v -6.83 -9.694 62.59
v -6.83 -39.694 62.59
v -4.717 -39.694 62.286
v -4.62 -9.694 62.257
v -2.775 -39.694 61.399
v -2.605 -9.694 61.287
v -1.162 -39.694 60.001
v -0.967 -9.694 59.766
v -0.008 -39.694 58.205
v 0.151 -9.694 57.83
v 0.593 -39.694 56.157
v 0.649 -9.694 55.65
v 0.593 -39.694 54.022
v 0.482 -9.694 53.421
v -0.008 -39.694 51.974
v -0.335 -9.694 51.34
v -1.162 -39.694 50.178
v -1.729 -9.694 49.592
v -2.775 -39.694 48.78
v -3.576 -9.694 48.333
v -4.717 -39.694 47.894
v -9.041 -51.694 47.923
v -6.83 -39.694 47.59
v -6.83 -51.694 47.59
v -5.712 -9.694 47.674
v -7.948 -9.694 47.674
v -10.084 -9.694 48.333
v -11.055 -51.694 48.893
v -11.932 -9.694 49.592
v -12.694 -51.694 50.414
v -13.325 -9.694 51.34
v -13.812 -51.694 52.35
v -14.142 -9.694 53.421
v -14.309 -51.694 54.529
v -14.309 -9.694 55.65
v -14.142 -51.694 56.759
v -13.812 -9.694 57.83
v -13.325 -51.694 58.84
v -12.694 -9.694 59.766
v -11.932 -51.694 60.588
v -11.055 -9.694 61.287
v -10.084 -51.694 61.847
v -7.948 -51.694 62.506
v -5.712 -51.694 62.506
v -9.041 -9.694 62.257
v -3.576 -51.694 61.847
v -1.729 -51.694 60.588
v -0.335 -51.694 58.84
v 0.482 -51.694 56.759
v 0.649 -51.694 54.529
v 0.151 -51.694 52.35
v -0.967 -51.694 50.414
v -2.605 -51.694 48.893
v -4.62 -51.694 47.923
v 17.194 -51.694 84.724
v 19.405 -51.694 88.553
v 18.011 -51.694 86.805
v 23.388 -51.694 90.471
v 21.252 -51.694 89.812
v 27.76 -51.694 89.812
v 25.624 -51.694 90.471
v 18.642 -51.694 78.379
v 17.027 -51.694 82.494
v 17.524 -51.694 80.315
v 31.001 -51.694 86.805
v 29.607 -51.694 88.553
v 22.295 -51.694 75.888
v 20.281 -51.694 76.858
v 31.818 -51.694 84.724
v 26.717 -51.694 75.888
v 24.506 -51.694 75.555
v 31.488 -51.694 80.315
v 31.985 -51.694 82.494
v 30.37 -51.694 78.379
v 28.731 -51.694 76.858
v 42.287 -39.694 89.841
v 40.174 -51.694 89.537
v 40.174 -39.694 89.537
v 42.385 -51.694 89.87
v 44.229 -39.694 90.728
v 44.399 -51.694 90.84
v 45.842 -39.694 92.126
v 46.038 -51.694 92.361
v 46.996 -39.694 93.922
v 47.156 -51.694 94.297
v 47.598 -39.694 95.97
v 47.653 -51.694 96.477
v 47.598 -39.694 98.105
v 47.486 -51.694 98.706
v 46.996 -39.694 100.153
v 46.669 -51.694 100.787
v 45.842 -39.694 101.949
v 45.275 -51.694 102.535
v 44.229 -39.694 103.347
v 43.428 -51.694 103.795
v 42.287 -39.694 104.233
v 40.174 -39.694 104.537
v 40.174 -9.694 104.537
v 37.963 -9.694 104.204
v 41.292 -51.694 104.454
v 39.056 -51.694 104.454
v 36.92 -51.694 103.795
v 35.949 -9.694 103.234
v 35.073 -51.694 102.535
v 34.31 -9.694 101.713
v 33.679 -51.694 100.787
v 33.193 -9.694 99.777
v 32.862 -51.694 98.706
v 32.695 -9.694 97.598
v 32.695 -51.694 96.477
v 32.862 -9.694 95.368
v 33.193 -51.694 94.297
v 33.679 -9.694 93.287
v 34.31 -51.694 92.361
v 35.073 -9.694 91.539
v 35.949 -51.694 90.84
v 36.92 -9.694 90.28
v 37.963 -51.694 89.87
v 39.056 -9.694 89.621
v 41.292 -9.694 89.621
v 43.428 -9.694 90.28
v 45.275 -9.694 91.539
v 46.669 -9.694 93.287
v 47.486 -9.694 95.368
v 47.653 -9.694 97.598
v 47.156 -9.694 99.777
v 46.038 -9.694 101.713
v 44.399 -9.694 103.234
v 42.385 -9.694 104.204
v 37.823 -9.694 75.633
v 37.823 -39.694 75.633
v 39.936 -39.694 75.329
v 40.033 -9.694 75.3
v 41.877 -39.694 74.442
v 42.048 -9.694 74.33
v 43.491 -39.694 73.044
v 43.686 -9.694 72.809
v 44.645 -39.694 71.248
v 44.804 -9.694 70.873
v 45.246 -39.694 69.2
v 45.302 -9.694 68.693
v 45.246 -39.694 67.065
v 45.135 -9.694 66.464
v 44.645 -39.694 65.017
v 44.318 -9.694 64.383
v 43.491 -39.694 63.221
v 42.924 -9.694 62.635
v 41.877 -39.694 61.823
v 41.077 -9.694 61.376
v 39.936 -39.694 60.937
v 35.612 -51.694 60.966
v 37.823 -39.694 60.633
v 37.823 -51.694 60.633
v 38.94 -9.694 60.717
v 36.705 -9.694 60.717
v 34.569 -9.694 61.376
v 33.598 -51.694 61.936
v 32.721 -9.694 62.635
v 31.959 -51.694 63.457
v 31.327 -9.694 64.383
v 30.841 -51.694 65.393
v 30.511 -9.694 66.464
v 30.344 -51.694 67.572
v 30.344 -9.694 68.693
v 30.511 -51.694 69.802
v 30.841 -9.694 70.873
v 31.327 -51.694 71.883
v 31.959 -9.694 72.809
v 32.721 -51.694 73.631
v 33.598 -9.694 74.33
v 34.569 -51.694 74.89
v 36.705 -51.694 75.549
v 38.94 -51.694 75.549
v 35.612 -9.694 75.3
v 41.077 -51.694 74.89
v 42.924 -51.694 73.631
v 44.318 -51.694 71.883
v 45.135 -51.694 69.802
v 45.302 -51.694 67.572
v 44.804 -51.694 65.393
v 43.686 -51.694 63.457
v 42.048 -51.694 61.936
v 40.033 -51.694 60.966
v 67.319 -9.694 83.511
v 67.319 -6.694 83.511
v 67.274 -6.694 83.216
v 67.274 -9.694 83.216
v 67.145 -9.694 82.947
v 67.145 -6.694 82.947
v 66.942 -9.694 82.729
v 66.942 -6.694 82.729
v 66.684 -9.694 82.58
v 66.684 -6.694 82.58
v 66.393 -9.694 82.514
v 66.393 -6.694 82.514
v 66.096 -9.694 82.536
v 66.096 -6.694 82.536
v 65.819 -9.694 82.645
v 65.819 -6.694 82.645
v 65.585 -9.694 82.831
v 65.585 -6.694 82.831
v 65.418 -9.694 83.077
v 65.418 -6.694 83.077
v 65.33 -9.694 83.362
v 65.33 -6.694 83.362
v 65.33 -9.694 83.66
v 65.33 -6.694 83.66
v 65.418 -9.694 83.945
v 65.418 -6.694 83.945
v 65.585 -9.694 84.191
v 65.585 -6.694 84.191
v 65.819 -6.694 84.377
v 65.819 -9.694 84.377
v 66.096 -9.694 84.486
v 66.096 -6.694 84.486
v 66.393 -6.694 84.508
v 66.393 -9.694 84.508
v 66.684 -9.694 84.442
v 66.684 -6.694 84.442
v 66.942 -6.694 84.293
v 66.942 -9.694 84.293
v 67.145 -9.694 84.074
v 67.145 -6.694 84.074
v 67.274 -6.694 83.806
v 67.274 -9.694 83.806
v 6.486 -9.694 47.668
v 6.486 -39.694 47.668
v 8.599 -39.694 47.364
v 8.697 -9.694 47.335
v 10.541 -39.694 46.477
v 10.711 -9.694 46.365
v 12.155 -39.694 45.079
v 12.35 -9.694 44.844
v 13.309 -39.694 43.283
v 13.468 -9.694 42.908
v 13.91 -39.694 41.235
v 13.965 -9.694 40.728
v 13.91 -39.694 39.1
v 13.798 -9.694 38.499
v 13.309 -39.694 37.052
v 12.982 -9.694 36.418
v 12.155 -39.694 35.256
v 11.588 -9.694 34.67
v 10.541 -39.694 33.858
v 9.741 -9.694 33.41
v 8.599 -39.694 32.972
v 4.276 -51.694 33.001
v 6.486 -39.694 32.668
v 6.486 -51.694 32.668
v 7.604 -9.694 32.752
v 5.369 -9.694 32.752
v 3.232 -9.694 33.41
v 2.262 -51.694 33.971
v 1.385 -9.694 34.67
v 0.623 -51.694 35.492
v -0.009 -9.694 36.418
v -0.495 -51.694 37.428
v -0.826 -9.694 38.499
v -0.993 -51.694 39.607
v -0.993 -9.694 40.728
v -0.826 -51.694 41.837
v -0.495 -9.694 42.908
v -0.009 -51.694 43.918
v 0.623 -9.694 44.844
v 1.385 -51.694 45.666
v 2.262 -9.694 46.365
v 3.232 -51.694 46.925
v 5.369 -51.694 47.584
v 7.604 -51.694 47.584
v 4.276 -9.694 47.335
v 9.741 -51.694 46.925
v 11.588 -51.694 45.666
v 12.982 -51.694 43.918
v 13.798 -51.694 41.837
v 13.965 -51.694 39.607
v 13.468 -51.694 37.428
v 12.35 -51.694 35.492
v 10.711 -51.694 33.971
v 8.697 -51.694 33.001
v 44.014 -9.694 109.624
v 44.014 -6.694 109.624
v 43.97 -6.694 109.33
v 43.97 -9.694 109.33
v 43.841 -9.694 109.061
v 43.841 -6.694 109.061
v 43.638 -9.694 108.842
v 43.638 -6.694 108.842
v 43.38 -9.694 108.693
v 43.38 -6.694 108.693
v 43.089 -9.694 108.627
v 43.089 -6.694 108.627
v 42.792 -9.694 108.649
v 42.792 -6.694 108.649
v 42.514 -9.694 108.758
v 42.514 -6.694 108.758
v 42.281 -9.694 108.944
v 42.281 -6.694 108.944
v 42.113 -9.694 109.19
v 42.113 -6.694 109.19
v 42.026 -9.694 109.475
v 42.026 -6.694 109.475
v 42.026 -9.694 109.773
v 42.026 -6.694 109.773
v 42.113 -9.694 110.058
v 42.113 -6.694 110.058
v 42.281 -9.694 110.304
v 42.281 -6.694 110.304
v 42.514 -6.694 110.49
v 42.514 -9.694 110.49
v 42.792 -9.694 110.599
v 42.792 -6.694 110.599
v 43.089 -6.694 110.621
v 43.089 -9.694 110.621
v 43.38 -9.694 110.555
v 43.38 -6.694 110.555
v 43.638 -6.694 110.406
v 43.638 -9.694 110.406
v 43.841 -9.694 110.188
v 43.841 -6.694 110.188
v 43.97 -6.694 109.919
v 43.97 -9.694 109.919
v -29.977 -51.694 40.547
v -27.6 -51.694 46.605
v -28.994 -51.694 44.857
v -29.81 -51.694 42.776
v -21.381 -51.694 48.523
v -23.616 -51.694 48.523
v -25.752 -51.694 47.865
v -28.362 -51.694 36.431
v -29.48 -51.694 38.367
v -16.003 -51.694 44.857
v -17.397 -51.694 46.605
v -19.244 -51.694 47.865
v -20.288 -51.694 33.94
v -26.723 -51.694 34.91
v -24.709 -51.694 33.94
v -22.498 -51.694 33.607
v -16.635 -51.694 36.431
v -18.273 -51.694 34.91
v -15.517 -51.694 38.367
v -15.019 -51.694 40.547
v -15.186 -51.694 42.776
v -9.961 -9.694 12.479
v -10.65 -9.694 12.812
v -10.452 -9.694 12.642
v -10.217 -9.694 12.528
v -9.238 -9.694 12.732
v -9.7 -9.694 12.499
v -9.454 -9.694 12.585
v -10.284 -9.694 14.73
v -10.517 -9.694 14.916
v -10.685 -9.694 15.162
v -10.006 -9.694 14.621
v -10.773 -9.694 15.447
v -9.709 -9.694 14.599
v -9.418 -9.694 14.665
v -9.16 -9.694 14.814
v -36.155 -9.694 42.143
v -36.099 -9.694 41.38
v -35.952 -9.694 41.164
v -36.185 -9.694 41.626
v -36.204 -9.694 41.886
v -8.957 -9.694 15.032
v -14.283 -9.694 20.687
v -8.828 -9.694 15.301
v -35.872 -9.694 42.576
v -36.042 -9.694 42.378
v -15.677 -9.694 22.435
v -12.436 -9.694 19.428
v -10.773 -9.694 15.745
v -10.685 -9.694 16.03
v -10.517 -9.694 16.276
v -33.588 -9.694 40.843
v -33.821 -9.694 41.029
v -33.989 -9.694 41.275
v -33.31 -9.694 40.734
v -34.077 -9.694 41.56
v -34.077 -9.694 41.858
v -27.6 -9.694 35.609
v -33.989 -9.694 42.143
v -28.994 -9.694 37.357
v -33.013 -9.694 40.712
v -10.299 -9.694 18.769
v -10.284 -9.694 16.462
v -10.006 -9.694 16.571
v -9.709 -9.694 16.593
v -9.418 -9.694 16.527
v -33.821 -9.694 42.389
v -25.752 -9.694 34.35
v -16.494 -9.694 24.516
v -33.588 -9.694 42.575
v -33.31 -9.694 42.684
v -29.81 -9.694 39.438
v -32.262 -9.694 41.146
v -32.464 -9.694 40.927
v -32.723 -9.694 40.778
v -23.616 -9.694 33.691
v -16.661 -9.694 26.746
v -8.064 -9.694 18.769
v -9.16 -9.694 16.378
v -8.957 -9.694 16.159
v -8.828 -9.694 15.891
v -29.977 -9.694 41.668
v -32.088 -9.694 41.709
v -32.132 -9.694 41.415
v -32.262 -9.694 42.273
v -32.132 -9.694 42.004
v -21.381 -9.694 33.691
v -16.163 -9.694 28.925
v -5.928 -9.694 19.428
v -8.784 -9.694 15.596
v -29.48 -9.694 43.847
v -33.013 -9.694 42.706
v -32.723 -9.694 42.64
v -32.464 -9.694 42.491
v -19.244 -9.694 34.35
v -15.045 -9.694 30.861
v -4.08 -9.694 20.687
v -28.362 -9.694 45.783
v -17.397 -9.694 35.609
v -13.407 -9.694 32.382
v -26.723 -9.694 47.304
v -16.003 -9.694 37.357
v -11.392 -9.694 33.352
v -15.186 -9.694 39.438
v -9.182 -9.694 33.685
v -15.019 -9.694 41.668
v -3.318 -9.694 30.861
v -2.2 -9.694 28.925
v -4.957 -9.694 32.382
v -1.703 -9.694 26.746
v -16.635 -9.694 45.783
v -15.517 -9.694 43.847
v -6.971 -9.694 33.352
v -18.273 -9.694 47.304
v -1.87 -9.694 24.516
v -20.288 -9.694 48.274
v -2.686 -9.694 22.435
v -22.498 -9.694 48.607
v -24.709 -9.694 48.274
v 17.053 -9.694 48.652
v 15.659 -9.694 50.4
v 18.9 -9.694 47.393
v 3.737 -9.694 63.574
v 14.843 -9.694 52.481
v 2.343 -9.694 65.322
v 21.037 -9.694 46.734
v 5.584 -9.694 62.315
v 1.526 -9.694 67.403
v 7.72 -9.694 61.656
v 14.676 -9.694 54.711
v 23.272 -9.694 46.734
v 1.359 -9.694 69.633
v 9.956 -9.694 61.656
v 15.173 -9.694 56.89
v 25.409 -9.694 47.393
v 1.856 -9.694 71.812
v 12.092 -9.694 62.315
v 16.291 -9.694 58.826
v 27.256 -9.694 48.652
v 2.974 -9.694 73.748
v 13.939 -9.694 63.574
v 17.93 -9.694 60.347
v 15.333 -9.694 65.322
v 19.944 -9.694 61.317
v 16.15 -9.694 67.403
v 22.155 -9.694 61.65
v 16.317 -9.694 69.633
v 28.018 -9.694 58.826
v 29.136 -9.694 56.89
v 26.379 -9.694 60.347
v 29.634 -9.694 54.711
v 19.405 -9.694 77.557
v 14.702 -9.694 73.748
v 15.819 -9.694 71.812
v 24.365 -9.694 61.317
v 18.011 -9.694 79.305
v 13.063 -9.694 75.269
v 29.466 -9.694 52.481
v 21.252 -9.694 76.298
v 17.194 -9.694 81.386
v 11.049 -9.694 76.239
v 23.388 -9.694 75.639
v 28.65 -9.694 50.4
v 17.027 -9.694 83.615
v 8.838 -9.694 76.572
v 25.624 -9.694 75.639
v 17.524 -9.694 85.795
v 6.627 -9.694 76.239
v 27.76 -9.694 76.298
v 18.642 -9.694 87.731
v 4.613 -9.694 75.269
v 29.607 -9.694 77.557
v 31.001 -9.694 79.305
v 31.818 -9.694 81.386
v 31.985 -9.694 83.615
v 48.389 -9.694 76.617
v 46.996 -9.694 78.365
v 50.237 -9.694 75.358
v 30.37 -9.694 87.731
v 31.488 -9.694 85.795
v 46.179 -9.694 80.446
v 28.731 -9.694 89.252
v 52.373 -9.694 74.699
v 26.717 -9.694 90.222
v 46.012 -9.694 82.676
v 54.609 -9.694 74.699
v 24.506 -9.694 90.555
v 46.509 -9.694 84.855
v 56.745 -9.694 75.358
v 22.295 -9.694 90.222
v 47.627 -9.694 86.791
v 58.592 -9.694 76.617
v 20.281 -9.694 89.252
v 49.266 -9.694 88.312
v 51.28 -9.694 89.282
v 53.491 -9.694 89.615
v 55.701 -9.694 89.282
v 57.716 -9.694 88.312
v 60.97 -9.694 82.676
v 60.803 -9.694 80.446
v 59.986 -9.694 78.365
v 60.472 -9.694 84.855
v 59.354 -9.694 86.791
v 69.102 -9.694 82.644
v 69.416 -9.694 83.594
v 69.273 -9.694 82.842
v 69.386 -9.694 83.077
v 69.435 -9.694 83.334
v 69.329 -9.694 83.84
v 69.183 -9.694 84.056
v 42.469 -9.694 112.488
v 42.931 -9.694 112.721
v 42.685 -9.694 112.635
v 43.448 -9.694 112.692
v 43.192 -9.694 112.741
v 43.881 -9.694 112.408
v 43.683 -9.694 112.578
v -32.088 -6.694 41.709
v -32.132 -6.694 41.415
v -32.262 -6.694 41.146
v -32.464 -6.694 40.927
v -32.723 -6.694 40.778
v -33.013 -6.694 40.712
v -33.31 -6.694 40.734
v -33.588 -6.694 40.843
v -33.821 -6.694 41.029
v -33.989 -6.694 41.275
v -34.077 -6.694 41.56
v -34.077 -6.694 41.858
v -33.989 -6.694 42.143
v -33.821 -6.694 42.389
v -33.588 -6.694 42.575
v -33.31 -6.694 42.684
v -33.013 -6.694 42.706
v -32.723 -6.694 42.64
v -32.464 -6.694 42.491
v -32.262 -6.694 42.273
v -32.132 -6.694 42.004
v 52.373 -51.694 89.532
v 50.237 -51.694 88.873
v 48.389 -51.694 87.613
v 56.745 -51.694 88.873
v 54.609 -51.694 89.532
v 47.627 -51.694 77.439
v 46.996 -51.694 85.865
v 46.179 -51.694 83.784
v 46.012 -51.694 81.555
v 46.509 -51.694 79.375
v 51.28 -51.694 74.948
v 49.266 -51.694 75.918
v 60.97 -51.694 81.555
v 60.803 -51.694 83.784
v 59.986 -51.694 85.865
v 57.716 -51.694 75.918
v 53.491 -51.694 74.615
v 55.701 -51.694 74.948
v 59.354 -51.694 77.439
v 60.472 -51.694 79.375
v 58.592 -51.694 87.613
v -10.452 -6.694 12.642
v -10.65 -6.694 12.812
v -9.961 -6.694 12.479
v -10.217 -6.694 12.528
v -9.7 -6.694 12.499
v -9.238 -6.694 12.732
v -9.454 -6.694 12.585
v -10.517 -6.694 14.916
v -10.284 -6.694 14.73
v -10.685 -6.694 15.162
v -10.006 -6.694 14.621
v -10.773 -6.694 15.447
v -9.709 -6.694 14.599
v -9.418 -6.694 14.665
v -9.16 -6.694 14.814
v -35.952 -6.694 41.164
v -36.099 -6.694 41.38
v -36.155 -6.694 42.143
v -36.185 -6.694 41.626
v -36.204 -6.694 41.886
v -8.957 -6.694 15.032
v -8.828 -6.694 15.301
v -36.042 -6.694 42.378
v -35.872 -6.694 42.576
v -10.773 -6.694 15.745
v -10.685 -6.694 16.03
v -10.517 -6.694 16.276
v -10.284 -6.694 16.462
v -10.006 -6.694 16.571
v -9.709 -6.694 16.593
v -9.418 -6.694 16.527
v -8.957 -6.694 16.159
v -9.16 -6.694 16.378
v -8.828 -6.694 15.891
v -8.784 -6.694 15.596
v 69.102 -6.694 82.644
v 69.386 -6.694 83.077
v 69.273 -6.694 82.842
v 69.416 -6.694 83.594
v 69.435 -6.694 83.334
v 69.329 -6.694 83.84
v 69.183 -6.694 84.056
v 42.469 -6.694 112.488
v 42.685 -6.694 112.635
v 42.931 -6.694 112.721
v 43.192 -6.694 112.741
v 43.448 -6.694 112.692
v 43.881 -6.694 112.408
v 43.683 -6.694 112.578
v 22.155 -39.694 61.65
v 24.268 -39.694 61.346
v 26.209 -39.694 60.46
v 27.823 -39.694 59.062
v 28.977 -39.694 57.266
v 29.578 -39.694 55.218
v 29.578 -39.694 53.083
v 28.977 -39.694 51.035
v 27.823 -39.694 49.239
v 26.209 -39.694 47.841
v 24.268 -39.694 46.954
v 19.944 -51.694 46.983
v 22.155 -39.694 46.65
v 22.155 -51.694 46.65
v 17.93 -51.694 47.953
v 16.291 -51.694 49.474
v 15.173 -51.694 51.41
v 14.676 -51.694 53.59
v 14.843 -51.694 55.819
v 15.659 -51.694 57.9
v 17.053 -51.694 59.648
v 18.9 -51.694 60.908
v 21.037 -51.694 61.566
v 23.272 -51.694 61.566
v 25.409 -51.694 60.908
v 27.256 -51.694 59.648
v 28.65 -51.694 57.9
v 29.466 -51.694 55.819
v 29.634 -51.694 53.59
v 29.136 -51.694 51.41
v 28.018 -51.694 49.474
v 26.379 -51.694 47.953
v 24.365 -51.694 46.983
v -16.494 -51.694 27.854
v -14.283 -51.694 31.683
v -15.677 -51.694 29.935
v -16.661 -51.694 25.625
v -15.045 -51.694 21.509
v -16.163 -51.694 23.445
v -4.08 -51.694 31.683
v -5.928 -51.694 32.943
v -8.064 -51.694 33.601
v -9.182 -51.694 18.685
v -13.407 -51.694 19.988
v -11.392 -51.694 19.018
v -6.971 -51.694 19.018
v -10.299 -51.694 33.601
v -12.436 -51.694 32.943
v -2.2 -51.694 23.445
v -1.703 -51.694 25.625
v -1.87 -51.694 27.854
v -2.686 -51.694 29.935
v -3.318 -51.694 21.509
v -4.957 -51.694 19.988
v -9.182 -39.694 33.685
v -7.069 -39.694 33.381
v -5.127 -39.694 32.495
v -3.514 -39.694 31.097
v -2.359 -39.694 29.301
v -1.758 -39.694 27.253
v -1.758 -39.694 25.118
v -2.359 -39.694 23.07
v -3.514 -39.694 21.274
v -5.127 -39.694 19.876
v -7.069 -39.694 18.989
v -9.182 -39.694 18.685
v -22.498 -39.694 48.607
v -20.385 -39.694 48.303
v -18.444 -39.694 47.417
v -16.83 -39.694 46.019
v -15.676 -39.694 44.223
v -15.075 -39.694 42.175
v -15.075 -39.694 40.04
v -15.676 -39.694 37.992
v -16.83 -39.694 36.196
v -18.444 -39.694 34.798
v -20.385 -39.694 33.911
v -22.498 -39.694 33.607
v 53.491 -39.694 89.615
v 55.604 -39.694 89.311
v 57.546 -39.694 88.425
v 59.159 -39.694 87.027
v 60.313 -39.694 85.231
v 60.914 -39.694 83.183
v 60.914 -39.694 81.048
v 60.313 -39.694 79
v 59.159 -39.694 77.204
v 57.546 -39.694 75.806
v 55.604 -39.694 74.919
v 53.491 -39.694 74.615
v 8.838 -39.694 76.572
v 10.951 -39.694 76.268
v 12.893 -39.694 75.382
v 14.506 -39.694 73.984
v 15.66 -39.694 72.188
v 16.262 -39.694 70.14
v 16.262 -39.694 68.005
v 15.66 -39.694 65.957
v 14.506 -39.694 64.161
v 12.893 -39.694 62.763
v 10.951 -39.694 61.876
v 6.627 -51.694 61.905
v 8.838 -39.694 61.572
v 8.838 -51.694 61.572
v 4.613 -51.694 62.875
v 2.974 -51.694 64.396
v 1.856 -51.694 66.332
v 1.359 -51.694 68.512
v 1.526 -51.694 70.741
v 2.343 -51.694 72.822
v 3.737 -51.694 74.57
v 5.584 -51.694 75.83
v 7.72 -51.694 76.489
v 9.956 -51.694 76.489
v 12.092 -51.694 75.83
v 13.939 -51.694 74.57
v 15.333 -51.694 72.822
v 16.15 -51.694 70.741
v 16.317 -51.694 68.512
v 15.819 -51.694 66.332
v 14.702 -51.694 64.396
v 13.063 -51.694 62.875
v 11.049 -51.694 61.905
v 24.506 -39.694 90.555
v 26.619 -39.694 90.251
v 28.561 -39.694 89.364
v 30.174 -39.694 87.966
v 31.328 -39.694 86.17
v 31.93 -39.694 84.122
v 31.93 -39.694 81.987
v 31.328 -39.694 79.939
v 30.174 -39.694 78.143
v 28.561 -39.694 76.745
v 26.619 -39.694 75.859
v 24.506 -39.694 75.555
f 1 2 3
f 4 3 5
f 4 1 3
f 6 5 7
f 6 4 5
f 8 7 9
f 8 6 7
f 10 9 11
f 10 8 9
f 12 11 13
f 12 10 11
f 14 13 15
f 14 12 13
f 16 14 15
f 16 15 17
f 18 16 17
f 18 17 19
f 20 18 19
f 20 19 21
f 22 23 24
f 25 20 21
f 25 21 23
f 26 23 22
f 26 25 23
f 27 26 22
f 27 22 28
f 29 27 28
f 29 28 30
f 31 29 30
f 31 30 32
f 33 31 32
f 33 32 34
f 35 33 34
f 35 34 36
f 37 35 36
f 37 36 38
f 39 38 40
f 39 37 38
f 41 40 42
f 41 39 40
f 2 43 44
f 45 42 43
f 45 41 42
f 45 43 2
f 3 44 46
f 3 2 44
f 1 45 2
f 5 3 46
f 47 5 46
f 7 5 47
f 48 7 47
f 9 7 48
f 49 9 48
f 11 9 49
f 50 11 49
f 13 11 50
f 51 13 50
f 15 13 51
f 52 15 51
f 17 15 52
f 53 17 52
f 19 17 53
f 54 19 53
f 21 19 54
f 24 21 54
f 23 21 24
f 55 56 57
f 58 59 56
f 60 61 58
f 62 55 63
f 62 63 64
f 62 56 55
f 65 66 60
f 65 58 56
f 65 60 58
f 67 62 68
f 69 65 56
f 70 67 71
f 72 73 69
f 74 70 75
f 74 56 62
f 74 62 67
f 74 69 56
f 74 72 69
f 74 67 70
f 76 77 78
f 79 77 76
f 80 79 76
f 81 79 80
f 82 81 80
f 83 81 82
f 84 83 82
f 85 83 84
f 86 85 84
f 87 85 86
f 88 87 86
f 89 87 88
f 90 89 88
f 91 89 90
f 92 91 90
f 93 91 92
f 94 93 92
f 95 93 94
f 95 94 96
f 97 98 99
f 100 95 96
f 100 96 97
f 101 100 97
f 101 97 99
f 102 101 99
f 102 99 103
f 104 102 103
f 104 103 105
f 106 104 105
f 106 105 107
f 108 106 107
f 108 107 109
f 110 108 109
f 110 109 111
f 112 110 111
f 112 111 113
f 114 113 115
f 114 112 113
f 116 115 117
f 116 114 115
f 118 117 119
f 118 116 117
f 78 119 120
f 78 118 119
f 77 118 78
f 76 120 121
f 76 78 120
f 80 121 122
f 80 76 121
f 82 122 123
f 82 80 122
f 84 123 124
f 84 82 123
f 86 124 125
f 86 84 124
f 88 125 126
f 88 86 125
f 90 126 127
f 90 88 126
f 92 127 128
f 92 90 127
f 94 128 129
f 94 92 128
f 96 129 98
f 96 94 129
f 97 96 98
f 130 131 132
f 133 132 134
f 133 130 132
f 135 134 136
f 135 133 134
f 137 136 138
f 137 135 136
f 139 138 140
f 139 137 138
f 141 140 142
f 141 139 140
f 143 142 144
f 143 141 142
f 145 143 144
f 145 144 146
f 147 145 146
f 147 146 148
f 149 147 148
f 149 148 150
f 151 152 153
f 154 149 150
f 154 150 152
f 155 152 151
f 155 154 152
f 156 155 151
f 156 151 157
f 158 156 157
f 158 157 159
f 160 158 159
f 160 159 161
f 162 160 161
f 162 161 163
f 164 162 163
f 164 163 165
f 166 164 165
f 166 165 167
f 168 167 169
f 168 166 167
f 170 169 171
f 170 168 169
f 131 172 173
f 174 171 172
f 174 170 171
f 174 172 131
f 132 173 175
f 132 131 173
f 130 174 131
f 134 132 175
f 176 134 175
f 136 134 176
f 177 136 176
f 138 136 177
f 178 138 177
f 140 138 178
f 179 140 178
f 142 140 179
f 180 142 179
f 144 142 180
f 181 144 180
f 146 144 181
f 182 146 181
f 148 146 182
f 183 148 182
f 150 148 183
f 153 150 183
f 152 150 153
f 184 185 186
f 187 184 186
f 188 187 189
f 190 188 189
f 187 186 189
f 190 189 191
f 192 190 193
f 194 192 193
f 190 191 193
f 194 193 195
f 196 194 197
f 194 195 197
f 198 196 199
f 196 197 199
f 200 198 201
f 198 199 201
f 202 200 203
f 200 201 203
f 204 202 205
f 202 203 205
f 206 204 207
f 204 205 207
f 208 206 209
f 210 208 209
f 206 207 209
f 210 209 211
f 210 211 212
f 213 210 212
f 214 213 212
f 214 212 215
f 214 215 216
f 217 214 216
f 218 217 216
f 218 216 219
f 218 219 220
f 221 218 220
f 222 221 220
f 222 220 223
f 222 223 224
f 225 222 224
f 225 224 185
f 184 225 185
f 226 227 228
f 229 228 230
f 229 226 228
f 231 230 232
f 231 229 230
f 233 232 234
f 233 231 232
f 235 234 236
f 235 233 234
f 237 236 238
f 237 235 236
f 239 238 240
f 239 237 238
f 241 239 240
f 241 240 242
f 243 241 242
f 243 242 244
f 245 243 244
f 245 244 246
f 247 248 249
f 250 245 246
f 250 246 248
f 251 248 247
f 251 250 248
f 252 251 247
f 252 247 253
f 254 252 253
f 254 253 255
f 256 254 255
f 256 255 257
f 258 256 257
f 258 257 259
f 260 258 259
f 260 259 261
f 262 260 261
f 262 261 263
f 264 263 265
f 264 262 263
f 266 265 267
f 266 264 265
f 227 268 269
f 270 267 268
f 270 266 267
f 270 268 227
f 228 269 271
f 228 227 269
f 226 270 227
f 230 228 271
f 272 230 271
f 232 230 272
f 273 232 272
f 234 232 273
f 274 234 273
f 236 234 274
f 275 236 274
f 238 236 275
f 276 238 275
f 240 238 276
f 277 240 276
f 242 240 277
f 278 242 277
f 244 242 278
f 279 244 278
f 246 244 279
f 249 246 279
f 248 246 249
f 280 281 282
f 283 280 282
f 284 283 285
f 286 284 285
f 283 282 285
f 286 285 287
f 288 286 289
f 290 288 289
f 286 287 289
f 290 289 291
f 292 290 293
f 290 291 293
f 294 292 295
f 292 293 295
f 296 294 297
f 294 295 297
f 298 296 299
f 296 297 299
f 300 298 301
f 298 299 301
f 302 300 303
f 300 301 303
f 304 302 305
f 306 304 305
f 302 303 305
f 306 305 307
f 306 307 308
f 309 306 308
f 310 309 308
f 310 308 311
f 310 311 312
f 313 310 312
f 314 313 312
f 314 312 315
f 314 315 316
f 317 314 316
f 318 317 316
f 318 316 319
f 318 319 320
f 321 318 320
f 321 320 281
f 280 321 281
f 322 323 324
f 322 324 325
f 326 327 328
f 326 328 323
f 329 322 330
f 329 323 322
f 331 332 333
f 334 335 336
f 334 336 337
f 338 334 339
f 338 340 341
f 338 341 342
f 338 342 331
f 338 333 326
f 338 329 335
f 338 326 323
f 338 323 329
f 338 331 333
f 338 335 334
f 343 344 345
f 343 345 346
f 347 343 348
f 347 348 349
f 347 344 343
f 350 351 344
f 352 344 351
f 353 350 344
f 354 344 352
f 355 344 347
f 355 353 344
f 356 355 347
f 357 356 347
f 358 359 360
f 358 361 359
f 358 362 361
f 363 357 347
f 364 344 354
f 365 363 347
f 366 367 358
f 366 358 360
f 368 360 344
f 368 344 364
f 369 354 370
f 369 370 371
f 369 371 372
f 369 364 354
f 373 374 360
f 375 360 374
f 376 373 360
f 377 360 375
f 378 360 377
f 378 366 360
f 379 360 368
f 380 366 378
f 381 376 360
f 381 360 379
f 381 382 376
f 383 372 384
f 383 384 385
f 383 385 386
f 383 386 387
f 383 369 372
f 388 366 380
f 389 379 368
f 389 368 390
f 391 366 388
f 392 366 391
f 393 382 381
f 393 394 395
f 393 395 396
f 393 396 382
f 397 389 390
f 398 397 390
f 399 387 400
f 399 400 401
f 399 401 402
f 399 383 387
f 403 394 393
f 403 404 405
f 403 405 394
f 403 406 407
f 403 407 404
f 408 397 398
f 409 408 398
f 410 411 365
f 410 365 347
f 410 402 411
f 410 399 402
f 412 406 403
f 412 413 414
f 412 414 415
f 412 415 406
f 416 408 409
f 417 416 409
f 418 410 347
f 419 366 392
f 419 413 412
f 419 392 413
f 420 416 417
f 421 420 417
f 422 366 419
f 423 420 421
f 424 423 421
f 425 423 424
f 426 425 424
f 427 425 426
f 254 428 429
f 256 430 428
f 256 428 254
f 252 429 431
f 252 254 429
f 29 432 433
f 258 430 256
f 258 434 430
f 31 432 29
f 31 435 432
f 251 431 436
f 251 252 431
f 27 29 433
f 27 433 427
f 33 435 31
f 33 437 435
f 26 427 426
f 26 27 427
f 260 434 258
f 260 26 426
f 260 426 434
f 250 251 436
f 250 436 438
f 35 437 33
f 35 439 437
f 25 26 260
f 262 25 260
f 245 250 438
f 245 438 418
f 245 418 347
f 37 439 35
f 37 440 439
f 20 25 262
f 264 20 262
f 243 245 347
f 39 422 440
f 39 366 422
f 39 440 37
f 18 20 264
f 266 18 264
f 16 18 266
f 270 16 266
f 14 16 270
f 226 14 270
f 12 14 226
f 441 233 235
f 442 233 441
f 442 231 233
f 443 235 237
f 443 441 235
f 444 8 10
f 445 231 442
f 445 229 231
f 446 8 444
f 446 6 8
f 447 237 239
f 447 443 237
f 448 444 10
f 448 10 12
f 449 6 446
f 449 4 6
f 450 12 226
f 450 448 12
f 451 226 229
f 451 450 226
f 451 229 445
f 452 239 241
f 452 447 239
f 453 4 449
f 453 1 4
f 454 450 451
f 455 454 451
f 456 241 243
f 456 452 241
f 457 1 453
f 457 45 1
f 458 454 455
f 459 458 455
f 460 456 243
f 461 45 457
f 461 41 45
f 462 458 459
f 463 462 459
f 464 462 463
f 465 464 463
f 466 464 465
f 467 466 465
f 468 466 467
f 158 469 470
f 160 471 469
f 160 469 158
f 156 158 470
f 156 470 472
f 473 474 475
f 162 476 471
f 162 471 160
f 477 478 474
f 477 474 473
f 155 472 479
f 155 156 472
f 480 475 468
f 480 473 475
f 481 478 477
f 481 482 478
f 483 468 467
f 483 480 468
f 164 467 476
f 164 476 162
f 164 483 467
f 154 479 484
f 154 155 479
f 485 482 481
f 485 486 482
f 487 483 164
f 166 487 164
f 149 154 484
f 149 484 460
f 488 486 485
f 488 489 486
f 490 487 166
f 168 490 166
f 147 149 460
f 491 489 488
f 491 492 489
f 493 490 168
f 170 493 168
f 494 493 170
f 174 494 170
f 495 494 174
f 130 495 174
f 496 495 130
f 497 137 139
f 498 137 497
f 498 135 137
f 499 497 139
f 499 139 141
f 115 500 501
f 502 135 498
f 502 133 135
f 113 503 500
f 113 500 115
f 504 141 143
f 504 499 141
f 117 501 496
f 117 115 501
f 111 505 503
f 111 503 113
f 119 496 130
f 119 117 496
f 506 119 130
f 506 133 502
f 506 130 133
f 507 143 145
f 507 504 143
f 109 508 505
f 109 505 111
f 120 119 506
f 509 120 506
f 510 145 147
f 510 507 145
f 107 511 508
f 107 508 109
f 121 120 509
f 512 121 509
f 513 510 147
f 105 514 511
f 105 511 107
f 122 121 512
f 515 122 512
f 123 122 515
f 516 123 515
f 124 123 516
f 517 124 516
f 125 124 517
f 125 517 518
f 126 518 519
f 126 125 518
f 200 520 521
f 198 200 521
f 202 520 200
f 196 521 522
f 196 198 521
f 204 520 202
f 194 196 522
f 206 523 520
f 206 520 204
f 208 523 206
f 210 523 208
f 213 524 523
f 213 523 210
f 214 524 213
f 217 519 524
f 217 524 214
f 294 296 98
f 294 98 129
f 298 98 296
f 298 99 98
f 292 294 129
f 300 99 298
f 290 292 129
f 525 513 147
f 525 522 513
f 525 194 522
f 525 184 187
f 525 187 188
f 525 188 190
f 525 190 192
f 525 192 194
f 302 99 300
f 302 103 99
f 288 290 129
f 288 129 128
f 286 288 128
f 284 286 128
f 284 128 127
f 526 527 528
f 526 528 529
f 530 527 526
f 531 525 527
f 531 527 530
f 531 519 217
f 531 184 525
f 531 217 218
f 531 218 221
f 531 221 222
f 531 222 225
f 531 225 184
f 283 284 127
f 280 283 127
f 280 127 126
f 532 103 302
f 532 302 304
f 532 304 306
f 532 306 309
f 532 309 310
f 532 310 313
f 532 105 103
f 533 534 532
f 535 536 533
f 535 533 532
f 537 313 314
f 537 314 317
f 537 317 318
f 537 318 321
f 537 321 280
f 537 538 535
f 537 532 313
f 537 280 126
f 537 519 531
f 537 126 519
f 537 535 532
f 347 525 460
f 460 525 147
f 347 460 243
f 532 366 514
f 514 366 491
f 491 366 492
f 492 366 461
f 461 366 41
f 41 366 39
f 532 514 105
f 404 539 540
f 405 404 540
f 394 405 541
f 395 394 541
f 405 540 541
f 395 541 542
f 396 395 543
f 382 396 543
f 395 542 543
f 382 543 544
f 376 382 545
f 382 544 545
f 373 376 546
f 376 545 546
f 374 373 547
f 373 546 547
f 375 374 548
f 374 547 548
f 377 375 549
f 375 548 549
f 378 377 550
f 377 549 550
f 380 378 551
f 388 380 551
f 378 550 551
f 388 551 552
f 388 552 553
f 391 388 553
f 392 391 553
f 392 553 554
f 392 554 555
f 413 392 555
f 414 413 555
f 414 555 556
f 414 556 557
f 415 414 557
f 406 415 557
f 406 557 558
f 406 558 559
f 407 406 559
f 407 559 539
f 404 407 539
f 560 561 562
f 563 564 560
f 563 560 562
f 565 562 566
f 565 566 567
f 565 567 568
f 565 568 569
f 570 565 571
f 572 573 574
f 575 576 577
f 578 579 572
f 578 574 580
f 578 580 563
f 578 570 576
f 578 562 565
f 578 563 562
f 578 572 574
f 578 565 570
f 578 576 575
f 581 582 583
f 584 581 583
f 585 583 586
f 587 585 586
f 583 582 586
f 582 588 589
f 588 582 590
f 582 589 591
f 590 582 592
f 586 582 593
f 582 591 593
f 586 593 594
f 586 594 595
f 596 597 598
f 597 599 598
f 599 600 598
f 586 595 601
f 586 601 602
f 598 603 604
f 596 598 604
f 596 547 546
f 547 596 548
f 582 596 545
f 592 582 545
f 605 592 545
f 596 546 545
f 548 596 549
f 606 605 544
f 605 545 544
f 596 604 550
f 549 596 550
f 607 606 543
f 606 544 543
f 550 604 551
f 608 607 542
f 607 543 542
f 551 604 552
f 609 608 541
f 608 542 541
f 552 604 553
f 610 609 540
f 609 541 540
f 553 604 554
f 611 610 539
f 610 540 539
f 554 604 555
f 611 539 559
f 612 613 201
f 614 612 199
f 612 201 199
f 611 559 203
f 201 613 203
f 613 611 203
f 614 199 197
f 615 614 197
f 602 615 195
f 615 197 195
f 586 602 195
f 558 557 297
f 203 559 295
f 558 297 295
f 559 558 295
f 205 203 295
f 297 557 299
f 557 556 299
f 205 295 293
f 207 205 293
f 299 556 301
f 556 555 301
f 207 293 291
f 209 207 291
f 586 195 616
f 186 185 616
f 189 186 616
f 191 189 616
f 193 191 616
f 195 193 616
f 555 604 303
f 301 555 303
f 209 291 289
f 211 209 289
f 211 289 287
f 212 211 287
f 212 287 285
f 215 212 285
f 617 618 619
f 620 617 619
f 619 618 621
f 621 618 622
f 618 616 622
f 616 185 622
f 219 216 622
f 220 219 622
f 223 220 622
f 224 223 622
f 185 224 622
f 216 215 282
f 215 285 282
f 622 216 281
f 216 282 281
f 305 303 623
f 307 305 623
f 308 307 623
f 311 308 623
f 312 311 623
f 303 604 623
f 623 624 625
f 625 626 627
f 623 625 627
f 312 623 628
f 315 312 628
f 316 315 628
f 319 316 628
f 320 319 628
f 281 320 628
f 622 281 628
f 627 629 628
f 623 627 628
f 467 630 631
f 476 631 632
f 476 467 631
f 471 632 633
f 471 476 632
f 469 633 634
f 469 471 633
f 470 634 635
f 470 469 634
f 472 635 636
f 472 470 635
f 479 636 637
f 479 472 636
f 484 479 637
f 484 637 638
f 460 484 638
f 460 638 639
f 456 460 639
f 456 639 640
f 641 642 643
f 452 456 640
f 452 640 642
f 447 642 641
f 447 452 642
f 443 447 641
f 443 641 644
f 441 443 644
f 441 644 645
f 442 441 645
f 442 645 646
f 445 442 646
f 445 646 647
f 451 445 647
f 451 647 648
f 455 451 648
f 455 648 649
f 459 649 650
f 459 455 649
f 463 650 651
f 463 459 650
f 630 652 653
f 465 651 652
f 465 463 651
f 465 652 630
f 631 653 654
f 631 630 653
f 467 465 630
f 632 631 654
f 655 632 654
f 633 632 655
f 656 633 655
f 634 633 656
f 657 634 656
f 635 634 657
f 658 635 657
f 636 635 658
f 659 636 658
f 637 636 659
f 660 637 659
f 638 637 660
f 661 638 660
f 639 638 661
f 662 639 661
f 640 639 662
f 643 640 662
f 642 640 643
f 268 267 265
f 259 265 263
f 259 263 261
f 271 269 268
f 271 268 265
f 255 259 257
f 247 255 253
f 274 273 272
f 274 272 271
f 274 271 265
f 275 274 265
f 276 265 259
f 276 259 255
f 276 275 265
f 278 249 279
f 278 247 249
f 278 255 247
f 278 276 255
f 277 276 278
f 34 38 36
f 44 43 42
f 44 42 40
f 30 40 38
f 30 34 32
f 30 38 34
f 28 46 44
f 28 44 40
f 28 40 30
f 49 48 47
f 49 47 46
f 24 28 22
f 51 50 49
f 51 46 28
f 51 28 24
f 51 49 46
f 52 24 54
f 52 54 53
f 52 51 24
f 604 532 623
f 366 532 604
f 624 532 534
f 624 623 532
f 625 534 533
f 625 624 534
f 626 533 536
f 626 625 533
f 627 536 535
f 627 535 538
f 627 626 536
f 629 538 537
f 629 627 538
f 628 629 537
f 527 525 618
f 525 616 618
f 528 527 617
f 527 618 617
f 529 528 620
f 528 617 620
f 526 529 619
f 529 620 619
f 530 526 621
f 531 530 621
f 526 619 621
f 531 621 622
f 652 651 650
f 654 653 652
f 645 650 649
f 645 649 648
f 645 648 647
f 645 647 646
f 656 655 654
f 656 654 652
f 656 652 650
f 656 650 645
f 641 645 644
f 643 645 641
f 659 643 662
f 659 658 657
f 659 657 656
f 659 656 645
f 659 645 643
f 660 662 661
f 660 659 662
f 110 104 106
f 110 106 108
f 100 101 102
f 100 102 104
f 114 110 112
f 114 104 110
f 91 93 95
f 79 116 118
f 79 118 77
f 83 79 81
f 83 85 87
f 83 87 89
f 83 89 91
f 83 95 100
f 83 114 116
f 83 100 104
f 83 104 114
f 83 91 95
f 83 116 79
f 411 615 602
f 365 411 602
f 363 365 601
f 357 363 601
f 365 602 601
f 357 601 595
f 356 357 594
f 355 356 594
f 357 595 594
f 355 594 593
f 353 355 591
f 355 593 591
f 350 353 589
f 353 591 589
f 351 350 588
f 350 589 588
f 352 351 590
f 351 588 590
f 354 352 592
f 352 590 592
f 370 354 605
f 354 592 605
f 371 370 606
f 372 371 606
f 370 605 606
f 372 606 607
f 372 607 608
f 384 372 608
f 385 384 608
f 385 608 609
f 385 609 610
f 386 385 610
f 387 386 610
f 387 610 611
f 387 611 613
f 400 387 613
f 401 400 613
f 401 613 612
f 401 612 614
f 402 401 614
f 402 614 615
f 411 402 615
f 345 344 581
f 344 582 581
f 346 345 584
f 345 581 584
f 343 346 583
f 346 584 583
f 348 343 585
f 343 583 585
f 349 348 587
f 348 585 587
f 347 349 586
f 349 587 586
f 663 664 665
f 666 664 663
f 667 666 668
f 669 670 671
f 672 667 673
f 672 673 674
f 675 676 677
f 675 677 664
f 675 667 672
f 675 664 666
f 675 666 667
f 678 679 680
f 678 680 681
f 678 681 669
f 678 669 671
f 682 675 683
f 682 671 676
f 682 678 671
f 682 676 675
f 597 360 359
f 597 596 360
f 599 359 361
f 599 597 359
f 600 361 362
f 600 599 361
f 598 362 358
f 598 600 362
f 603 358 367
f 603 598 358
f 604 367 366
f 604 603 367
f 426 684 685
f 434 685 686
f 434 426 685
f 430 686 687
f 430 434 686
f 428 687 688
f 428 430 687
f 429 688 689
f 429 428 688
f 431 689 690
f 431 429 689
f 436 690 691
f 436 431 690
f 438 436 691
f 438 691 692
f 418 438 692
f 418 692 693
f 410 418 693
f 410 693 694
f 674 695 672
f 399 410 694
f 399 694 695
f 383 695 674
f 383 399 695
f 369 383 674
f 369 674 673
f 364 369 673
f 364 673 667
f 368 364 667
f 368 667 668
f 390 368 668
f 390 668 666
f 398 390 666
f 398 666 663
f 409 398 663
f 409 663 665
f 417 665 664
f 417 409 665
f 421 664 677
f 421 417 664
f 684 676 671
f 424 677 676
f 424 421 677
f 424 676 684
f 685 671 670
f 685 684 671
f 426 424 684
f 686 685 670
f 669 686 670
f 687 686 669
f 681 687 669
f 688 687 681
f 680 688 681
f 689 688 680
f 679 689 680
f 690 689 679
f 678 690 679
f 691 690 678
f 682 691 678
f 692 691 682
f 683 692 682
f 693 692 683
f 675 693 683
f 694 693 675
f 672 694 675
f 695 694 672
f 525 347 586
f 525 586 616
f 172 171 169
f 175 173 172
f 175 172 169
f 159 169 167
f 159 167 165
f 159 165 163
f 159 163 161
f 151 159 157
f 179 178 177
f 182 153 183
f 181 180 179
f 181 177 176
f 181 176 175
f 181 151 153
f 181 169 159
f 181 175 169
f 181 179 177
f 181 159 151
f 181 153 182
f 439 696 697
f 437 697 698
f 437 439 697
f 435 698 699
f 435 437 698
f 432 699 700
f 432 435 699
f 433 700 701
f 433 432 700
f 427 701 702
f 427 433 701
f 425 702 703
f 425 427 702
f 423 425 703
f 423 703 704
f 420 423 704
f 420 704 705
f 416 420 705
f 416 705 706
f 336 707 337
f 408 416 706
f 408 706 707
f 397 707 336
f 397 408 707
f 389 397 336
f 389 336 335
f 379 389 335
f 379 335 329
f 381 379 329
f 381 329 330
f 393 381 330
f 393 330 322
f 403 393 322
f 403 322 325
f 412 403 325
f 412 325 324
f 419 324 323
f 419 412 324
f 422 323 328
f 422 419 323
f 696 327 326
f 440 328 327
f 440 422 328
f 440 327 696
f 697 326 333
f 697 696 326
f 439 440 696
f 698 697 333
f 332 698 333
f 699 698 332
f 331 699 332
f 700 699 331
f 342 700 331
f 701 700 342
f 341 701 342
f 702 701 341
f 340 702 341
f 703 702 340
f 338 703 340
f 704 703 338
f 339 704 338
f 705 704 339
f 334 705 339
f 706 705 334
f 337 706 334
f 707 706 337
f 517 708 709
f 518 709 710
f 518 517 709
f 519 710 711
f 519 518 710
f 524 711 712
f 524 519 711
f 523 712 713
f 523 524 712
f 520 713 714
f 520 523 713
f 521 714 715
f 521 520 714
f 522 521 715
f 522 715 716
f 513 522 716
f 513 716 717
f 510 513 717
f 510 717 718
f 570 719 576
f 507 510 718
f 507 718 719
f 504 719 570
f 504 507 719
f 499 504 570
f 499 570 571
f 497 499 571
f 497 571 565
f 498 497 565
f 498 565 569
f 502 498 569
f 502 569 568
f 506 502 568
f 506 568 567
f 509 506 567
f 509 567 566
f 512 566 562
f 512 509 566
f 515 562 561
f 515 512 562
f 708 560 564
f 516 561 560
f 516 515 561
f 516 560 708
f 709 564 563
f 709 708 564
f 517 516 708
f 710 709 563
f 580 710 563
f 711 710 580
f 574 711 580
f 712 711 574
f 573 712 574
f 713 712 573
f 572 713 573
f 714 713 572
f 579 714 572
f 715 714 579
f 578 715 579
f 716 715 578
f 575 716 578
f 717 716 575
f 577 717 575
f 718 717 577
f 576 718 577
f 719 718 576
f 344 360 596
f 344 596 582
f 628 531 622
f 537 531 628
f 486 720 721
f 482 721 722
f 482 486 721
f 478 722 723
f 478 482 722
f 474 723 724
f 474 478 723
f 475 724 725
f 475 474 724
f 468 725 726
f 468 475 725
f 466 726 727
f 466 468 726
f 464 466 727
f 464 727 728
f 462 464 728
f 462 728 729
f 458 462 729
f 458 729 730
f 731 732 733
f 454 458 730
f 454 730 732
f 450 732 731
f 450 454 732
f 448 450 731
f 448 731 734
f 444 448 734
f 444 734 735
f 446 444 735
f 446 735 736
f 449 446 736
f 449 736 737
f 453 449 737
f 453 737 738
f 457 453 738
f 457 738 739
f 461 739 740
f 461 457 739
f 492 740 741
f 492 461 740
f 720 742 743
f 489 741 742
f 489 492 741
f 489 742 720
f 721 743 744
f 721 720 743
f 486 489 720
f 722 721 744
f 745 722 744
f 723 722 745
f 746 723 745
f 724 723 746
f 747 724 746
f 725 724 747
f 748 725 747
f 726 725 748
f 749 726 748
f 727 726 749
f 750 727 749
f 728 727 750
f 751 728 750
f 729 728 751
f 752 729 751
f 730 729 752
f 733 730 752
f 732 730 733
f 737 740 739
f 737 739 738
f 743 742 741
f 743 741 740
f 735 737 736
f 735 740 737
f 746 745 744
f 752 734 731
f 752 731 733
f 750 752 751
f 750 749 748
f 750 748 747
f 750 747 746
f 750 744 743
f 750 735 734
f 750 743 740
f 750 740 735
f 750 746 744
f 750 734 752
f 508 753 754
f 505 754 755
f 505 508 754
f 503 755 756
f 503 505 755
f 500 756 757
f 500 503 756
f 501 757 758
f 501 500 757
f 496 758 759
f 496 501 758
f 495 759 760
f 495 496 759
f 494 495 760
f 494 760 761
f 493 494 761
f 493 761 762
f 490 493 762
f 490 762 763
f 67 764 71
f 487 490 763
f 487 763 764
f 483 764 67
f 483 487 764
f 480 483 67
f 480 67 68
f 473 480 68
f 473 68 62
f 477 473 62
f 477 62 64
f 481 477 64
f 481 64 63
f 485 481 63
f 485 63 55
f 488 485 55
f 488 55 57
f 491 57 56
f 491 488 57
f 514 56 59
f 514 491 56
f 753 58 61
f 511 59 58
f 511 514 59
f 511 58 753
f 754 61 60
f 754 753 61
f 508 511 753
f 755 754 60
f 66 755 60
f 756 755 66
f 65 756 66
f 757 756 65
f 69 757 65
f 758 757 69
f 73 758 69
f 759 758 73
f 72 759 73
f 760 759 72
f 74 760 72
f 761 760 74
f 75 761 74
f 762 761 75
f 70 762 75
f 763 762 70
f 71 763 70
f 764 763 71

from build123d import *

# Parameters (mm, degrees)
EXTRUDE_1_DEPTH       = 3
SKETCH_2_W            = 7.5
SKETCH_2_H            = 30
SKETCH_3_W            = 7.5
SKETCH_3_H            = 30
SKETCH_4_W            = 7.5
SKETCH_4_H            = 30
SKETCH_5_W            = 7.5
SKETCH_5_H            = 30
SKETCH_6_W            = 7.5
SKETCH_6_H            = 30
SKETCH_7_W            = 7.5
SKETCH_7_H            = 30
SKETCH_8_W            = 7.5
SKETCH_8_H            = 30
SKETCH_9_W            = 7.5
SKETCH_9_H            = 30
SKETCH_10_W           = 7.5
SKETCH_10_H           = 30
SKETCH_11_W           = 7.5
SKETCH_11_H           = 30
HOLE_WIZARD_2_0_2_1_D = 2
FILLET_1_R            = 1
EXTRUDE_START         = 12
SKETCH_14_R           = 7.5
EXTRUDE_2_DEPTH       = 12


with BuildPart() as part:
    # 草图1 → 凸台-拉伸1 (new body)
    with BuildSketch(Plane.XZ.offset(9.693825789)):
        Polygon((-36.617689836, 41.909926554), (-9.984344221, 12.065917083), (69.848381115, 83.310116605), (43.215035499, 113.154126076), align=None)
    extrude(amount=-EXTRUDE_1_DEPTH)

    # 草图2 → 旋转1 (revolve)
    with BuildSketch(Plane(origin=(0, 0, 68.132775199), x_dir=(-1, 0, 0), z_dir=(0, 0, -1)), mode=Mode.PRIVATE) as revolve_1_sk:
        with Locations((-41.57263666, -24.693825789)):
            Rectangle(SKETCH_2_W, SKETCH_2_H)
    revolve(revolve_1_sk.sketch.rotate(Axis((37.82263666, -39.693825789, 68.132775199), (0, 1, 0)), 270), axis=Axis((37.82263666, -39.693825789, 68.132775199), (0, 1, 0)))

    # 草图3 → 旋转2 (revolve)
    with BuildSketch(Plane(origin=(0, 0, 83.054779935), x_dir=(-1, 0, 0), z_dir=(0, 0, -1)), mode=Mode.PRIVATE) as revolve_2_sk:
        with Locations((-28.255963852, -24.693825789)):
            Rectangle(SKETCH_3_W, SKETCH_3_H)
    revolve(revolve_2_sk.sketch.rotate(Axis((24.505963852, -39.693825789, 83.054779935), (0, 1, 0)), 270), axis=Axis((24.505963852, -39.693825789, 83.054779935), (0, 1, 0)))

    # 草图4 → 旋转3 (revolve)
    with BuildSketch(Plane(origin=(0, 0, 97.037286383), x_dir=(-1, 0, 0), z_dir=(0, 0, -1)), mode=Mode.PRIVATE) as revolve_3_sk:
        with Locations((-43.924068825, -24.693825789)):
            Rectangle(SKETCH_4_W, SKETCH_4_H)
    revolve(revolve_3_sk.sketch.rotate(Axis((40.174068825, -39.693825789, 97.037286383), (0, 1, 0)), 270), axis=Axis((40.174068825, -39.693825789, 97.037286383), (0, 1, 0)))

    # 草图5 → 旋转4 (revolve)
    with BuildSketch(Plane(origin=(0, 0, 82.115281647), x_dir=(-1, 0, 0), z_dir=(0, 0, -1)), mode=Mode.PRIVATE) as revolve_4_sk:
        with Locations((-57.240741633, -24.693825789)):
            Rectangle(SKETCH_5_W, SKETCH_5_H)
    revolve(revolve_4_sk.sketch.rotate(Axis((53.490741633, -39.693825789, 82.115281647), (0, 1, 0)), 270), axis=Axis((53.490741633, -39.693825789, 82.115281647), (0, 1, 0)))

    # 草图6 → 旋转5 (revolve)
    with BuildSketch(Plane(origin=(0, 0, 69.072273487), x_dir=(-1, 0, 0), z_dir=(0, 0, -1)), mode=Mode.PRIVATE) as revolve_5_sk:
        with Locations((-12.58785888, -24.693825789)):
            Rectangle(SKETCH_6_W, SKETCH_6_H)
    revolve(revolve_5_sk.sketch.rotate(Axis((8.83785888, -39.693825789, 69.072273487), (0, 1, 0)), 270), axis=Axis((8.83785888, -39.693825789, 69.072273487), (0, 1, 0)))

    # 草图7 → 旋转6 (revolve)
    with BuildSketch(Plane(origin=(0, 0, 55.089767038), x_dir=(-1, 0, 0), z_dir=(0, 0, -1)), mode=Mode.PRIVATE) as revolve_6_sk:
        with Locations((3.080246092, -24.693825789)):
            Rectangle(SKETCH_7_W, SKETCH_7_H)
    revolve(revolve_6_sk.sketch.rotate(Axis((-6.830246092, -39.693825789, 55.089767038), (0, 1, 0)), 270), axis=Axis((-6.830246092, -39.693825789, 55.089767038), (0, 1, 0)))

    # 草图8 → 旋转7 (revolve)
    with BuildSketch(Plane(origin=(0, 0, 41.10726059), x_dir=(-1, 0, 0), z_dir=(0, 0, -1)), mode=Mode.PRIVATE) as revolve_7_sk:
        with Locations((18.748351065, -24.693825789)):
            Rectangle(SKETCH_8_W, SKETCH_8_H)
    revolve(revolve_7_sk.sketch.rotate(Axis((-22.498351065, -39.693825789, 41.10726059), (0, 1, 0)), 270), axis=Axis((-22.498351065, -39.693825789, 41.10726059), (0, 1, 0)))

    # 草图9 → 旋转8 (revolve)
    with BuildSketch(Plane(origin=(0, 0, 54.150268751), x_dir=(-1, 0, 0), z_dir=(0, 0, -1)), mode=Mode.PRIVATE) as revolve_8_sk:
        with Locations((-25.904531688, -24.693825789)):
            Rectangle(SKETCH_9_W, SKETCH_9_H)
    revolve(revolve_8_sk.sketch.rotate(Axis((22.154531688, -39.693825789, 54.150268751), (0, 1, 0)), 270), axis=Axis((22.154531688, -39.693825789, 54.150268751), (0, 1, 0)))

    # 草图10 → 旋转9 (revolve)
    with BuildSketch(Plane(origin=(0, 0, 40.167762303), x_dir=(-1, 0, 0), z_dir=(0, 0, -1)), mode=Mode.PRIVATE) as revolve_9_sk:
        with Locations((-10.236426715, -24.693825789)):
            Rectangle(SKETCH_10_W, SKETCH_10_H)
    revolve(revolve_9_sk.sketch.rotate(Axis((6.486426715, -39.693825789, 40.167762303), (0, 1, 0)), 270), axis=Axis((6.486426715, -39.693825789, 40.167762303), (0, 1, 0)))

    # 草图11 → 旋转10 (revolve)
    with BuildSketch(Plane(origin=(0, 0, 26.185255855), x_dir=(-1, 0, 0), z_dir=(0, 0, -1)), mode=Mode.PRIVATE) as revolve_10_sk:
        with Locations((5.431678257, -24.693825789)):
            Rectangle(SKETCH_11_W, SKETCH_11_H)
    revolve(revolve_10_sk.sketch.rotate(Axis((-9.181678257, -39.693825789, 26.185255855), (0, 1, 0)), 270), axis=Axis((-9.181678257, -39.693825789, 26.185255855), (0, 1, 0)))

    # Ø2.0 (2) 直径孔1 (through all)
    with Locations(Plane(origin=(0, -9.693825789, 0), x_dir=(-1, 0, 0), z_dir=(0, -1, 0))):
        with Locations((-43.014369008, -109.624291383), (9.78367773, -15.595751776), (33.087855144, -41.709260063), (-66.318546422, -83.510783096)):
            Hole(HOLE_WIZARD_2_0_2_1_D / 2)

    # 圆角1
    fillet_1_edges = [part.edges().sort_by_distance(p)[0] for p in [
        (43.215035499, -8.193825789, 113.154126076),
        (69.848381115, -8.193825789, 83.310116605),
        (-9.984344221, -8.193825789, 12.065917083),
        (-36.617689836, -8.193825789, 41.909926554),
    ]]
    fillet(fillet_1_edges, radius=FILLET_1_R)

    # 草图14 → 凸台-拉伸2 (add)
    with BuildSketch(Plane.XZ.offset(39.693825789).offset(EXTRUDE_START)):
        with Locations(Location((40.174068825, 97.037286383, 0), (0, 0, 270))):
            Circle(SKETCH_14_R)
        with Locations(Location((24.505963852, 83.054779935, 0), (0, 0, 270))):
            Circle(SKETCH_14_R)
        with Locations(Location((8.83785888, 69.072273487, 0), (0, 0, 270))):
            Circle(SKETCH_14_R)
        with Locations(Location((-6.830246092, 55.089767038, 0), (0, 0, 270))):
            Circle(SKETCH_14_R)
        with Locations(Location((-22.498351065, 41.10726059, 0), (0, 0, 270))):
            Circle(SKETCH_14_R)
        with Locations(Location((-9.181678257, 26.185255855, 0), (0, 0, 270))):
            Circle(SKETCH_14_R)
        with Locations(Location((6.486426715, 40.167762303, 0), (0, 0, 270))):
            Circle(SKETCH_14_R)
        with Locations(Location((22.154531688, 54.150268751, 0), (0, 0, 270))):
            Circle(SKETCH_14_R)
        with Locations(Location((37.82263666, 68.132775199, 0), (0, 0, 270))):
            Circle(SKETCH_14_R)
        with Locations(Location((53.490741633, 82.115281647, 0), (0, 0, 270))):
            Circle(SKETCH_14_R)
    extrude(amount=-EXTRUDE_2_DEPTH)


solid = part.part
